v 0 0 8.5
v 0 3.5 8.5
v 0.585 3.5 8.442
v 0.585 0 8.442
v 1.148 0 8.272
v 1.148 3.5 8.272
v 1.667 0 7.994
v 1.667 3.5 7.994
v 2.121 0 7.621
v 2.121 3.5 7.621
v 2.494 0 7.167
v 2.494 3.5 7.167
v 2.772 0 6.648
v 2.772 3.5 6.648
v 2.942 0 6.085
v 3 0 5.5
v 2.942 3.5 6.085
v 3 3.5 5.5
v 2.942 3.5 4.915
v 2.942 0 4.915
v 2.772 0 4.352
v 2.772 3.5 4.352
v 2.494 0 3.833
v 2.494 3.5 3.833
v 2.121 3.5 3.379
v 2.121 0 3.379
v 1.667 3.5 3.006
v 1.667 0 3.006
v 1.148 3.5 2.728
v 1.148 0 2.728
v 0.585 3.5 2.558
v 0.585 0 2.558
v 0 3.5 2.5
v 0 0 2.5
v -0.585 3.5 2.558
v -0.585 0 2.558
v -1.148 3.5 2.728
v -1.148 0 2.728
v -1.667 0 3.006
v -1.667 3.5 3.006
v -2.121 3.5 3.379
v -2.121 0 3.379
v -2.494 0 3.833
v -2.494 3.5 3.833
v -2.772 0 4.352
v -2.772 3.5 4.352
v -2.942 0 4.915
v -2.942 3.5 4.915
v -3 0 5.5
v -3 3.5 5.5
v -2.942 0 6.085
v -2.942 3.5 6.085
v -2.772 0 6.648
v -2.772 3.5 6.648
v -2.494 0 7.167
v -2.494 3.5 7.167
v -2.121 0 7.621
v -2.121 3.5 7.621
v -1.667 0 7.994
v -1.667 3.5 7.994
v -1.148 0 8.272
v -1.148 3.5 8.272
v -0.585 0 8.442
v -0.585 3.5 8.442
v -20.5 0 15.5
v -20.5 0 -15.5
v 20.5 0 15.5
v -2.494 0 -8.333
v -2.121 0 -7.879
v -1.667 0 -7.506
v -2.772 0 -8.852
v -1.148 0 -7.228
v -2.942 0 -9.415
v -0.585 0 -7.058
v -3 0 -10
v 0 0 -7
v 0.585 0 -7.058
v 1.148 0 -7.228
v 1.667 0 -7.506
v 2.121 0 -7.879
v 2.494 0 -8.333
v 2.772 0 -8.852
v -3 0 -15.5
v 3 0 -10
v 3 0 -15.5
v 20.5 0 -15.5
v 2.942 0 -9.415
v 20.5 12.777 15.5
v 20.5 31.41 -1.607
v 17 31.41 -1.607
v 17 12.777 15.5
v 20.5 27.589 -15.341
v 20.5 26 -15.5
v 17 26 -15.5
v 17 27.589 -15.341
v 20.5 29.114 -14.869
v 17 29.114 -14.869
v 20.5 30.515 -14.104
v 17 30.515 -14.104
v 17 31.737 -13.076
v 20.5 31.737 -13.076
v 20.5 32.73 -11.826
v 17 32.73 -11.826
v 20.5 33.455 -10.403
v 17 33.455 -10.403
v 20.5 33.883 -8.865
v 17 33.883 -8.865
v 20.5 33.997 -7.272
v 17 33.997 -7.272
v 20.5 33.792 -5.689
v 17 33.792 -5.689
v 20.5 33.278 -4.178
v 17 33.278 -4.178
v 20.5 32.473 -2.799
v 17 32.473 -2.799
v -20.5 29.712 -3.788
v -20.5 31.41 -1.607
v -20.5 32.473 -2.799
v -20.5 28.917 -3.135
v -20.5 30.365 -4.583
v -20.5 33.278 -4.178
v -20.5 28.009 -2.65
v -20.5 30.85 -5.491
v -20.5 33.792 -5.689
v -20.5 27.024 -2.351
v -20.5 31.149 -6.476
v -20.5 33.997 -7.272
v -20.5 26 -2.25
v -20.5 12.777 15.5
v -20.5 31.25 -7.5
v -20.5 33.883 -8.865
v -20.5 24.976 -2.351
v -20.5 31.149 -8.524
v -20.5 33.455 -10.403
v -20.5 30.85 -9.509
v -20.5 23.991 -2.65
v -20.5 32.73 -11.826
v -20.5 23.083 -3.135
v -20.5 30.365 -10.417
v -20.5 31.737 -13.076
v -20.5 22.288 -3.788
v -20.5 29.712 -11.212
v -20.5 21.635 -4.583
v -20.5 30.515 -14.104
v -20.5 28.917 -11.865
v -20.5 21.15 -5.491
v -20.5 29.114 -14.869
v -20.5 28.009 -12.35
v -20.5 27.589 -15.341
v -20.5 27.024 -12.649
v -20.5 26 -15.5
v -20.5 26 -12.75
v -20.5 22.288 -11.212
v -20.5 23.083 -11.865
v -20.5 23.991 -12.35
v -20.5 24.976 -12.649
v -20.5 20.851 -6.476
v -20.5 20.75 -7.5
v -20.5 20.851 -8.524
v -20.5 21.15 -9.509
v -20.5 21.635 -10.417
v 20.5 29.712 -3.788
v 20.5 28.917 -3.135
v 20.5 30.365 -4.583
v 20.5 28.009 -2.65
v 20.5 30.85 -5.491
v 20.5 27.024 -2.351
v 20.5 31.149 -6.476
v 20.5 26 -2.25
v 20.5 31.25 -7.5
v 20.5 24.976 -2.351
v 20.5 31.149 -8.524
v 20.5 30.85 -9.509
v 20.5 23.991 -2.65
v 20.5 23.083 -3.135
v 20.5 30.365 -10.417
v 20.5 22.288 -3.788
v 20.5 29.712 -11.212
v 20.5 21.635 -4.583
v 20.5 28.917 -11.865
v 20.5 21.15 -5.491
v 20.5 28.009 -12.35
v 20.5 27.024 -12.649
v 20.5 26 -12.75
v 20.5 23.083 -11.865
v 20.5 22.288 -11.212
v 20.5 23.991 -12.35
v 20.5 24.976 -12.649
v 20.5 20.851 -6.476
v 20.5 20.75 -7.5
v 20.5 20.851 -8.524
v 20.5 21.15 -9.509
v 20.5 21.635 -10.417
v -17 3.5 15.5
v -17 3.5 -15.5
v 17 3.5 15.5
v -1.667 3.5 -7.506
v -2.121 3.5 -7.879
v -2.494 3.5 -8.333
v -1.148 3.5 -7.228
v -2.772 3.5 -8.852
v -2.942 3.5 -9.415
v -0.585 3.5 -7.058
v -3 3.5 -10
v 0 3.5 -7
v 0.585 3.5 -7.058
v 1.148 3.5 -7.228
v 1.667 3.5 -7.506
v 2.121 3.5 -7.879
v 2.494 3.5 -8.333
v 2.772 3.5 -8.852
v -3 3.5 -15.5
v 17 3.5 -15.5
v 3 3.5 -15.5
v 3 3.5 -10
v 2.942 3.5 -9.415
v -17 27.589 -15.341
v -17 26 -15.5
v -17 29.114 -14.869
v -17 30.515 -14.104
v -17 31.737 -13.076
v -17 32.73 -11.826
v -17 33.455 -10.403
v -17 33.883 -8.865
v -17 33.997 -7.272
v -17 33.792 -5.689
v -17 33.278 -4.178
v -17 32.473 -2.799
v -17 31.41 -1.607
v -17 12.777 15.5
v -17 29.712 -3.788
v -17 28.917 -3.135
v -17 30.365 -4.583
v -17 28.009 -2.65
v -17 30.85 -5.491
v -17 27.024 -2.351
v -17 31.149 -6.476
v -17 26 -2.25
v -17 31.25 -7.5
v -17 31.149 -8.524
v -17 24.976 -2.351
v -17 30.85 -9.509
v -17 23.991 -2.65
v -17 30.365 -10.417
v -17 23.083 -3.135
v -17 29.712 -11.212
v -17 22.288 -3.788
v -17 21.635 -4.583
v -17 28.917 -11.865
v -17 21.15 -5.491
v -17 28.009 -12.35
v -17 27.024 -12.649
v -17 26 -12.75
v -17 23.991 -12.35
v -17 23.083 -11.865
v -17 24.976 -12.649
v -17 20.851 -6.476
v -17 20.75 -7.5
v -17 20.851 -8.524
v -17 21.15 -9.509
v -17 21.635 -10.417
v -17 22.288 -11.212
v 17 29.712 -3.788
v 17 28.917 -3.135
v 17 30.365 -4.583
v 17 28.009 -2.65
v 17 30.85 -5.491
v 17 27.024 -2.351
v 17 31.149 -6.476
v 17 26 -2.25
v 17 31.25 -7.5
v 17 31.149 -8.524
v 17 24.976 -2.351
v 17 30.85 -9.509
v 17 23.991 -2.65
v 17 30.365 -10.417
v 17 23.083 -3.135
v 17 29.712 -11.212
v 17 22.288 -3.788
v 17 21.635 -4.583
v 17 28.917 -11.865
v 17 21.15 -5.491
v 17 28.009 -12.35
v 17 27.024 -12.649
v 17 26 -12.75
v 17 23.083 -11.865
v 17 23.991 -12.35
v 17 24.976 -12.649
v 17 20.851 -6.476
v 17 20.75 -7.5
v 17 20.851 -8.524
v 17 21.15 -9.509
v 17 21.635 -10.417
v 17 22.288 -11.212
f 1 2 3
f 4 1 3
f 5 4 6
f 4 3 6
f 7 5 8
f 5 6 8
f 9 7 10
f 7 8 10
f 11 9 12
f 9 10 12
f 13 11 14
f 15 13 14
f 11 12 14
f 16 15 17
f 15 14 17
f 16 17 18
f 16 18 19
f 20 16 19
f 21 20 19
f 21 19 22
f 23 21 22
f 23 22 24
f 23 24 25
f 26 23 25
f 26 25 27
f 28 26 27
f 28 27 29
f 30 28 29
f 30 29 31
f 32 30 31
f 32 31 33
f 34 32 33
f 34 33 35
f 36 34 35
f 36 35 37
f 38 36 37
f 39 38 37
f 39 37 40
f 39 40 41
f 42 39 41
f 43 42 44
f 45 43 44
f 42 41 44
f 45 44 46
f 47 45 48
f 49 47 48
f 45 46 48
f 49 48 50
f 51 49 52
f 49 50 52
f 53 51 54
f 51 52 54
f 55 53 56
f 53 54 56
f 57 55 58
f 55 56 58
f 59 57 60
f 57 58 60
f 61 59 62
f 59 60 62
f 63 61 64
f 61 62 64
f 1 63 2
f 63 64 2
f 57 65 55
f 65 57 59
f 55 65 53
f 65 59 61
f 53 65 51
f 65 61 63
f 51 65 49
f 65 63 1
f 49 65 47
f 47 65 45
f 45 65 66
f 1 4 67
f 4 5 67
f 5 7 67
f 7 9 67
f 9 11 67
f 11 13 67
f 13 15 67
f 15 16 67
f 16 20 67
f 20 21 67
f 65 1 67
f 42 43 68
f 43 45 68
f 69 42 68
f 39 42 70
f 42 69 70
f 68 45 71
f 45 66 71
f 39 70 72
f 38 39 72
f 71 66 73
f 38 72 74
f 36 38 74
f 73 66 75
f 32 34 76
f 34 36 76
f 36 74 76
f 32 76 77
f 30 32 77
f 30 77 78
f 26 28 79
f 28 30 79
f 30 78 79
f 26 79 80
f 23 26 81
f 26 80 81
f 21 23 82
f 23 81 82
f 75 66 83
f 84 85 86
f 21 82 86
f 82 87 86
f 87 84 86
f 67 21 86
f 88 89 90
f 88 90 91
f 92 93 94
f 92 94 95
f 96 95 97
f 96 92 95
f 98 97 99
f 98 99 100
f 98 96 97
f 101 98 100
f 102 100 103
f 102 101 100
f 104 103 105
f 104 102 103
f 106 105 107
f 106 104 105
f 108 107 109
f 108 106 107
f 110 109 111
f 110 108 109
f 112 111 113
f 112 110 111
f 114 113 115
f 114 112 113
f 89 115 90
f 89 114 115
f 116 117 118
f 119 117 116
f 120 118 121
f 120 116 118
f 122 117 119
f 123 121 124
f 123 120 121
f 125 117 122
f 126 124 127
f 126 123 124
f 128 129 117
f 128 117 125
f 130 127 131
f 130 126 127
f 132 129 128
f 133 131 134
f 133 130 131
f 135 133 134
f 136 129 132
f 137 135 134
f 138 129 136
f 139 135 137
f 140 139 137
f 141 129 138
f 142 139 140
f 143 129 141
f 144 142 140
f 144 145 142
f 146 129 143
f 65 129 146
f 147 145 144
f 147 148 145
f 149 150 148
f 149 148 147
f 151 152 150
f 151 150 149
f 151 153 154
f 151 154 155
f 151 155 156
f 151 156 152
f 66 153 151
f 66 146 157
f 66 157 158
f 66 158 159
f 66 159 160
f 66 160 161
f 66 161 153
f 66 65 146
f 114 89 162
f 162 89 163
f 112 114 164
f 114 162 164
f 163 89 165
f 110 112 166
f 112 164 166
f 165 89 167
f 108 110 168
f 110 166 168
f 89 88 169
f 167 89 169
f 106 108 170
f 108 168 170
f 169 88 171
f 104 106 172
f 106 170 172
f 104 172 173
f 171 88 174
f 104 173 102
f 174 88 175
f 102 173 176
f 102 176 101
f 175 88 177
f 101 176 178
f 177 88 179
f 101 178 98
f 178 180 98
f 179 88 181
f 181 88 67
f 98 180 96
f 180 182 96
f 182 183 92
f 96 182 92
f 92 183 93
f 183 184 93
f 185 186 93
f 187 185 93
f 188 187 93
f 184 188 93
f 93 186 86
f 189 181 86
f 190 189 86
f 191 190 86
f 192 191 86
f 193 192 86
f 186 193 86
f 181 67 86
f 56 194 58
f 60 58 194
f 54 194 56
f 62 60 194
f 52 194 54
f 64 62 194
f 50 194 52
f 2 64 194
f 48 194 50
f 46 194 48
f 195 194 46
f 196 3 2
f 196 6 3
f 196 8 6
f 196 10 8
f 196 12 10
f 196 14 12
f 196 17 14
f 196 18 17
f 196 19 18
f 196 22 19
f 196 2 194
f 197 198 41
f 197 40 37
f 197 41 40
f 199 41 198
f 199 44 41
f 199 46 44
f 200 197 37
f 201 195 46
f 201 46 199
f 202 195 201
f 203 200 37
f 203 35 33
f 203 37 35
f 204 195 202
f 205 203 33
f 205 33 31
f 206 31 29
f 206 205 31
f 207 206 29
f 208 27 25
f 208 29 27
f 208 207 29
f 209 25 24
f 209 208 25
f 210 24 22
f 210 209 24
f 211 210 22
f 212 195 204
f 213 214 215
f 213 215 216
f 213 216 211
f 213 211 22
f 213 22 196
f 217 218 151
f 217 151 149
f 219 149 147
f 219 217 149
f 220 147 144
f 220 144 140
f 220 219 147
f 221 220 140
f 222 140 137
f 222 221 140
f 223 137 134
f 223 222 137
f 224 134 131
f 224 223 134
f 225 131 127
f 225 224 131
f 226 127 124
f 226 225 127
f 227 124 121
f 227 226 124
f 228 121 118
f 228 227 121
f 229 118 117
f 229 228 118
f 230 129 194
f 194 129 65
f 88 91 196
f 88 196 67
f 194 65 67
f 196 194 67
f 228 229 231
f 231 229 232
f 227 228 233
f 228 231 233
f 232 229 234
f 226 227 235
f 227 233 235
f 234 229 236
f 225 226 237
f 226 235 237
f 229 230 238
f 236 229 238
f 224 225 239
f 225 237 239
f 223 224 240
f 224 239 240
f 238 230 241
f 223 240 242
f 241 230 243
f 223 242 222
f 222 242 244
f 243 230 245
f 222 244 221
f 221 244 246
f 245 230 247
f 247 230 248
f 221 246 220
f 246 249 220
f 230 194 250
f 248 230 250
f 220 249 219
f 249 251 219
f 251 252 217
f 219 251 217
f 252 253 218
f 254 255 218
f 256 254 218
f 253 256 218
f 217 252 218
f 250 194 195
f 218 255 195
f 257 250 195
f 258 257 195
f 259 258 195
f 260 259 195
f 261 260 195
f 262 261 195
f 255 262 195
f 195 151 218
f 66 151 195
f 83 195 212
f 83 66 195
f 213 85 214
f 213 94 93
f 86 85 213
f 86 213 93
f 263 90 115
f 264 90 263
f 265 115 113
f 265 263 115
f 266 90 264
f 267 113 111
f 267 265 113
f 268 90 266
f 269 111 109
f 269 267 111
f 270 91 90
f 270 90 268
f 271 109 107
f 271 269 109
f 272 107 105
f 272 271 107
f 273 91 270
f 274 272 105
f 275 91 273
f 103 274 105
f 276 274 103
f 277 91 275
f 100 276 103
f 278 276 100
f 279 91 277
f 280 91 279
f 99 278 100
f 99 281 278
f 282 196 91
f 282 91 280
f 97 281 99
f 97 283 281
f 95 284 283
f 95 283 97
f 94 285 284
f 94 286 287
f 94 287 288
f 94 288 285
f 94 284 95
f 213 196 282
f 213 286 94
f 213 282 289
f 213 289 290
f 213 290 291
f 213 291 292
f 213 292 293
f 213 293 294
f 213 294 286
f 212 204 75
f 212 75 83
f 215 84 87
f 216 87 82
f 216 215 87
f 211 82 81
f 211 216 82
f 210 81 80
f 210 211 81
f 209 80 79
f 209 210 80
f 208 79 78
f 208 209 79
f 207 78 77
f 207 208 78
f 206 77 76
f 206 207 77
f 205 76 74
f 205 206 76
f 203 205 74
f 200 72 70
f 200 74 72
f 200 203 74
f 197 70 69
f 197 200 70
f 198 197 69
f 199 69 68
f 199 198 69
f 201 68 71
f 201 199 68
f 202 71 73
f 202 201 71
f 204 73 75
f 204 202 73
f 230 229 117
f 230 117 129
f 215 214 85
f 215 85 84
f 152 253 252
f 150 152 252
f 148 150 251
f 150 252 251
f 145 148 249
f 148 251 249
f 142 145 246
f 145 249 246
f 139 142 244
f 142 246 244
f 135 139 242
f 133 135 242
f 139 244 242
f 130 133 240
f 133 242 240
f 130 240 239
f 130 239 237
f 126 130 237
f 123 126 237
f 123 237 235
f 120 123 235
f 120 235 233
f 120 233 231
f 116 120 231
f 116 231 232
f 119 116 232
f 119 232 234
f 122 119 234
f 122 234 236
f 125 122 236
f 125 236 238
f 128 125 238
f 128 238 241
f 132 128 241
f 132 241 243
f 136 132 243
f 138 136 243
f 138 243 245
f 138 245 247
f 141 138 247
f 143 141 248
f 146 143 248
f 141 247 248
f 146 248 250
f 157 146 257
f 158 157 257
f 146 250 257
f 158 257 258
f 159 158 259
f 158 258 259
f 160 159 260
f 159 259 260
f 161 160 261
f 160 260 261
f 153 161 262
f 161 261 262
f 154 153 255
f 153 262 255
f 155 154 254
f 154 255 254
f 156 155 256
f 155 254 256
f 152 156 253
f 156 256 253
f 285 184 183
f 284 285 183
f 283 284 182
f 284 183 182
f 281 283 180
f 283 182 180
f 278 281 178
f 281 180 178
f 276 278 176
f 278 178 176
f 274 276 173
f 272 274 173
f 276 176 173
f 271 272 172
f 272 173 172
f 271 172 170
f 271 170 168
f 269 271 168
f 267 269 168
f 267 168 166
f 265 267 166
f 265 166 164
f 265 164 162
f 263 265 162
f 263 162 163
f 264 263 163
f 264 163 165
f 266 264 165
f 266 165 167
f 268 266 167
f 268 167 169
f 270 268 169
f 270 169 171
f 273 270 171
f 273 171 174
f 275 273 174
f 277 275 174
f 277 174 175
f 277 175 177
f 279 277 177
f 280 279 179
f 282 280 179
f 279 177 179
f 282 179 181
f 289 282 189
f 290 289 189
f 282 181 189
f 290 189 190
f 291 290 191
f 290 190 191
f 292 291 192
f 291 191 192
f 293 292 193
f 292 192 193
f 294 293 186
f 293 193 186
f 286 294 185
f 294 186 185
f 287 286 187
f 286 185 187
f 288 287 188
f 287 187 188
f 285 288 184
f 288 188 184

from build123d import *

# Parameters (mm, degrees)
SKETCH_1_W          = 41
SKETCH_1_H          = 31
EXTRUDE_1_DEPTH     = 3.5
SKETCH_2_W          = 3.5
SKETCH_2_H          = 31
EXTRUDE_2_DEPTH     = 40
SKETCH_3_R          = 5.25
CUT_EXTRUDE_2_DEPTH = 62.753542409
SKETCH_4_R          = 3
CUT_EXTRUDE_3_DEPTH = 40


with BuildPart() as part:
    # 草图1 → 凸台-拉伸1 (new body)
    with BuildSketch(Plane(origin=(0, 0, 0), x_dir=(1, 0, 0), z_dir=(0, 1, 0))):
        Rectangle(SKETCH_1_W, SKETCH_1_H)
    extrude(amount=EXTRUDE_1_DEPTH)

    # 草图2 → 凸台-拉伸2 (add)
    with BuildSketch(Plane(origin=(0, 3.5, 0), x_dir=(1, 0, 0), z_dir=(0, 1, 0))):
        with Locations((-18.75, 0)):
            Rectangle(SKETCH_2_W, SKETCH_2_H)
        with Locations((18.75, 0)):
            Rectangle(SKETCH_2_W, SKETCH_2_H)
    extrude(amount=EXTRUDE_2_DEPTH)

    # 草图3 → 切除-拉伸2 (cut, through all)
    with BuildSketch(Plane(origin=(20.5, 0, 0), x_dir=(0, 0, -1), z_dir=(1, 0, 0))):
        with Locations((7.5, 26)):
            Circle(SKETCH_3_R)
        with BuildLine():
            Line((1.60695917, 31.41036688), (-15.5, 12.77724807))
            Line((-15.5, 12.77724807), (-15.5, 43.5))
            Line((-15.5, 43.5), (15.5, 43.5))
            Line((15.5, 43.5), (15.5, 26))
            ThreePointArc((15.5, 26), (10.403073661, 33.454673925), (1.60695917, 31.41036688))
        make_face()
    extrude(amount=-CUT_EXTRUDE_2_DEPTH, mode=Mode.SUBTRACT)

    # 草图4 → 切除-拉伸3 (cut)
    with BuildSketch(Plane(origin=(0, 3.5, 0), x_dir=(1, 0, 0), z_dir=(0, 1, 0))):
        with Locations(Location((0, -5.5, 0), (0, 0, 270))):
            Circle(SKETCH_4_R)
        with BuildLine():
            Line((-3, 10), (-3, 15.5))
            Line((-3, 15.5), (3, 15.5))
            Line((3, 15.5), (3, 10))
            ThreePointArc((3, 10), (0, 7), (-3, 10))
        make_face()
    extrude(amount=-CUT_EXTRUDE_3_DEPTH, mode=Mode.SUBTRACT)


solid = part.part
